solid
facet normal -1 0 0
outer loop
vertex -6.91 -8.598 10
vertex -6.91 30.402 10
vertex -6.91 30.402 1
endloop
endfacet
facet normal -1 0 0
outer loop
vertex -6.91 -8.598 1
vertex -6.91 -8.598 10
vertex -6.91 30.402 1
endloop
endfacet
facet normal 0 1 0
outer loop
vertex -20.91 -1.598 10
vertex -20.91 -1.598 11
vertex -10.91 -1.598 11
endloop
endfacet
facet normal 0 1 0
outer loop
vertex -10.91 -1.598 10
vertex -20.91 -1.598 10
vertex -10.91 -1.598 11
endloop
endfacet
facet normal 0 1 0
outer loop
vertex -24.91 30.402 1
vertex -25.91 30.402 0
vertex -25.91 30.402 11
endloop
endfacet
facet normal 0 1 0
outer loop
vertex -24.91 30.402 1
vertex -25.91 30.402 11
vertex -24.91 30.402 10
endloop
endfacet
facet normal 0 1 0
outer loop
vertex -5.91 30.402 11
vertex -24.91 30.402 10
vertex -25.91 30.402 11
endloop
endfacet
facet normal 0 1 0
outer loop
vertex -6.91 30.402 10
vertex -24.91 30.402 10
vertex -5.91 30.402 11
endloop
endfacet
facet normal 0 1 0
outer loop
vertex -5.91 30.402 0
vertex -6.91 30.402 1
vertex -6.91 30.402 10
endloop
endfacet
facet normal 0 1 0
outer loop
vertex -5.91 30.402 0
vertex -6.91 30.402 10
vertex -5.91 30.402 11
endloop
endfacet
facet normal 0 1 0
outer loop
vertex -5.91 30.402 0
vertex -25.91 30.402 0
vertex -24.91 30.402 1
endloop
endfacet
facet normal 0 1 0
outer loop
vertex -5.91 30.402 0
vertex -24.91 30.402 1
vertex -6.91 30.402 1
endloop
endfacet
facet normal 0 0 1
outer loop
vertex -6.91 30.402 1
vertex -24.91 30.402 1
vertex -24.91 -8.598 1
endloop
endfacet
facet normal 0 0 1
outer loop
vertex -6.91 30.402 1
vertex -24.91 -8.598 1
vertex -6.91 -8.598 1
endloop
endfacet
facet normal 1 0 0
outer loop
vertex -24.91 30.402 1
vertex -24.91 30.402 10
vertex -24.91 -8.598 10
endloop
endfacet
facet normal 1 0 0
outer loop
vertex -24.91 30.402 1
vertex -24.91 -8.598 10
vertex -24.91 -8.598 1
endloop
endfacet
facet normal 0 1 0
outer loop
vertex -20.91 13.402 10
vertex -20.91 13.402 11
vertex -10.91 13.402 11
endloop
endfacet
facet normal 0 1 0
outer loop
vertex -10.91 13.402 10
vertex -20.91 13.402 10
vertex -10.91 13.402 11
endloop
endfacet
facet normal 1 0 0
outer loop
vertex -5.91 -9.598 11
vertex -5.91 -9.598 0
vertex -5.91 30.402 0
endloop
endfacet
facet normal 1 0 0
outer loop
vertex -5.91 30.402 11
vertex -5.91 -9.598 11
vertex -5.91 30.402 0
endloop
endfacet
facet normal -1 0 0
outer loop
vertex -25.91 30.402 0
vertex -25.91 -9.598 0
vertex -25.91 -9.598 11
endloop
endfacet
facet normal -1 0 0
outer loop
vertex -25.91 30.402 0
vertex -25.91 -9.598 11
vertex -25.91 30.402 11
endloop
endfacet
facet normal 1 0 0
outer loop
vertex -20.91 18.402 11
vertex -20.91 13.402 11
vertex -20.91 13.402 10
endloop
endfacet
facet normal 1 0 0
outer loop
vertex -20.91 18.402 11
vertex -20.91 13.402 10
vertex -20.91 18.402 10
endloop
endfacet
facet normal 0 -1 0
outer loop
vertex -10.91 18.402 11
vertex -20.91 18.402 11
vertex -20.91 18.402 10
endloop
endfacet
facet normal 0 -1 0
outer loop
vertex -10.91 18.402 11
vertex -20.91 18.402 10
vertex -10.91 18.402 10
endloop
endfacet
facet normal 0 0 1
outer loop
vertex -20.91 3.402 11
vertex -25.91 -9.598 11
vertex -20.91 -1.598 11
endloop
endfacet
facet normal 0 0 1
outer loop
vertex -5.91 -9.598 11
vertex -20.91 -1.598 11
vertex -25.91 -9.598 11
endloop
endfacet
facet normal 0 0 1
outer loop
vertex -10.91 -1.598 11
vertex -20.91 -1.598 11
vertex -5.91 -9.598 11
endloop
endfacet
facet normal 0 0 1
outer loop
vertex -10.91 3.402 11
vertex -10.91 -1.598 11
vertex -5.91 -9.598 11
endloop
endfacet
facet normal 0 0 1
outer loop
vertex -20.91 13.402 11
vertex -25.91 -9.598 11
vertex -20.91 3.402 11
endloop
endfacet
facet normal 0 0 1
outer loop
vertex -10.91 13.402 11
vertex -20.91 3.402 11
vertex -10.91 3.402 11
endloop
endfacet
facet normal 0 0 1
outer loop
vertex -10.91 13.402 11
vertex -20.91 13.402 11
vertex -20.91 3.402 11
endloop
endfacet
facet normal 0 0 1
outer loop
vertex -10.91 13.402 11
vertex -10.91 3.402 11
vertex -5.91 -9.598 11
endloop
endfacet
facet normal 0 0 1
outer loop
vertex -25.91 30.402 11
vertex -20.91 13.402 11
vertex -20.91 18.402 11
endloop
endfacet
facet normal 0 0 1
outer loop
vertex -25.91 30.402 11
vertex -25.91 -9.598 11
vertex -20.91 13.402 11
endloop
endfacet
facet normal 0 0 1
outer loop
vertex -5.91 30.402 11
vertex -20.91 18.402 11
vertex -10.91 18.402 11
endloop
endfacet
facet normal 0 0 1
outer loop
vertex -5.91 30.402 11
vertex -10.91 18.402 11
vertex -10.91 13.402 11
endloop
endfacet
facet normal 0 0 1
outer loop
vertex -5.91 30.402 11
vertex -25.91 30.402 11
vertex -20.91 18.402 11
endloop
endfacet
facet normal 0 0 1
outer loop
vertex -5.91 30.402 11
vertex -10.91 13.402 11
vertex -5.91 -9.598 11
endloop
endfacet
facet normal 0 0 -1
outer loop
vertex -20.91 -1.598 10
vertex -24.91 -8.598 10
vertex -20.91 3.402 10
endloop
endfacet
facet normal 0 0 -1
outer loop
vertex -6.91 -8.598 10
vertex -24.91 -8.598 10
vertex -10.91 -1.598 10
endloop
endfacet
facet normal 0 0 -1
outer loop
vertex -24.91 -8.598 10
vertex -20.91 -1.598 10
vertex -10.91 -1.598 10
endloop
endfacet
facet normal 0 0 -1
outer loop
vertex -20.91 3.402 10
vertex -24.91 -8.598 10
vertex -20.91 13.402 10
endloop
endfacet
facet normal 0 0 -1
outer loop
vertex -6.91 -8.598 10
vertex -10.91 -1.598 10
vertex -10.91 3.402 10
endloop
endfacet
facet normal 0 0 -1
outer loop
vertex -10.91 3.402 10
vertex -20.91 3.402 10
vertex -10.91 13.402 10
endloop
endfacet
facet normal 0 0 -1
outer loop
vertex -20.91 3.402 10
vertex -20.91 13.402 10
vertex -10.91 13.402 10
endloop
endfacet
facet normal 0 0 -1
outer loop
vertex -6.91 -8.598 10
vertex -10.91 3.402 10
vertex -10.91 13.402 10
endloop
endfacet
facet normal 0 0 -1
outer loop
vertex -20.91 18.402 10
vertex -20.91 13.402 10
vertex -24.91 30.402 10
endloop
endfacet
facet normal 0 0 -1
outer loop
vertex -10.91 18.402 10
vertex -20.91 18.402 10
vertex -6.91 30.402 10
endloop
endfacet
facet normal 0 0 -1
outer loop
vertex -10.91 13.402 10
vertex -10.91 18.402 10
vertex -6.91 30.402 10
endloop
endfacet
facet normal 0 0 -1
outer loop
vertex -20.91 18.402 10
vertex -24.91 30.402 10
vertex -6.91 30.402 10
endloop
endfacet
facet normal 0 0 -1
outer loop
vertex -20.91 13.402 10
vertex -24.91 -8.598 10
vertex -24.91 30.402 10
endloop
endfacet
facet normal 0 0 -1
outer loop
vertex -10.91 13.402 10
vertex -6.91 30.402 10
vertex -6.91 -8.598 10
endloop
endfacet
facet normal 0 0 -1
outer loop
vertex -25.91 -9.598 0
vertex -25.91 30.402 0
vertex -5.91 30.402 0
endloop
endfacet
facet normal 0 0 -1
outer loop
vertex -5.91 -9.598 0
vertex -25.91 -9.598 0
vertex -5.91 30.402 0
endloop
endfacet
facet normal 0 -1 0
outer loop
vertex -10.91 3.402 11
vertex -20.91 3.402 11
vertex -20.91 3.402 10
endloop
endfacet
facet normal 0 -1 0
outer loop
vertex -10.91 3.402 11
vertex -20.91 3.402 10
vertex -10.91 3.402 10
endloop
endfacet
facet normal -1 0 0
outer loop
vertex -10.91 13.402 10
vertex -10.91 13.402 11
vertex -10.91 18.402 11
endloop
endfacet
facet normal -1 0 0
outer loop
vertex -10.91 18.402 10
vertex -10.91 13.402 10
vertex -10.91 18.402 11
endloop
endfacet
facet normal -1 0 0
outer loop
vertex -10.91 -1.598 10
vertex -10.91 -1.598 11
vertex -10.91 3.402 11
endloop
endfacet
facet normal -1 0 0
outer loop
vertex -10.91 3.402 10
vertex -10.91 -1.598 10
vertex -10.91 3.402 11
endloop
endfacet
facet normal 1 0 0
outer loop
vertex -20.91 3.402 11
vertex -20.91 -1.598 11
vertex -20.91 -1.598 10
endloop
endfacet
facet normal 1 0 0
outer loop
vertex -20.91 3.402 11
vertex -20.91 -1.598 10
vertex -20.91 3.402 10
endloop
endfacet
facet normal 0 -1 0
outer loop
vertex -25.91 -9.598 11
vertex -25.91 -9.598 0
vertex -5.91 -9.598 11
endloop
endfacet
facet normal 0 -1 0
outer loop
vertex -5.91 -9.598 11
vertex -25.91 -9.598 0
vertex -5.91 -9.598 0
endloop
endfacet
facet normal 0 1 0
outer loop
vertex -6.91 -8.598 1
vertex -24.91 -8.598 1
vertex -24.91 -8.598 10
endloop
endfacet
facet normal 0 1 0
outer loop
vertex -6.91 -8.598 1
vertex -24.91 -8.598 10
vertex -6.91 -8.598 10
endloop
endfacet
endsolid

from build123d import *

# Parameters (mm, degrees)
SKETCH1_W               = 20
SKETCH1_H               = 40
BOSS_EXTRUDE1_DEPTH     = 11
SKETCH2_W               = 18
SKETCH2_H               = 9
CUT_EXTRUDE1_DEPTH      = 39
SKETCH3_W               = 10
SKETCH3_H               = 5
CUT_EXTRUDE2_DEPTH      = 6
CUT_EXTRUDE2_DEPTH_BACK = 4


with BuildPart() as part:
    # Sketch1 → Boss-Extrude1 (new body)
    with BuildSketch(Plane.XY):
        with Locations((-15.909713685, 10.402437659)):
            Rectangle(SKETCH1_W, SKETCH1_H)
    extrude(amount=BOSS_EXTRUDE1_DEPTH)

    # Sketch2 → Cut-Extrude1 (cut)
    with BuildSketch(Plane(origin=(0, 30.402437659, 0), x_dir=(1, 0, 0), z_dir=(0, 1, 0))):
        with Locations((-15.909713685, -5.5)):
            Rectangle(SKETCH2_W, SKETCH2_H)
    extrude(amount=-CUT_EXTRUDE1_DEPTH, mode=Mode.SUBTRACT)

    # Sketch3 → Cut-Extrude2 (cut, two sides)
    with BuildSketch(Plane.XY.offset(11)) as cut_extrude2_sk:
        with Locations((-15.909713685, 15.902437659)):
            Rectangle(SKETCH3_W, SKETCH3_H)
        with Locations((-15.909713685, 0.902437659)):
            Rectangle(SKETCH3_W, SKETCH3_H)
    extrude(amount=CUT_EXTRUDE2_DEPTH, mode=Mode.SUBTRACT)
    extrude(cut_extrude2_sk.sketch, amount=-CUT_EXTRUDE2_DEPTH_BACK, mode=Mode.SUBTRACT)


solid = part.part
